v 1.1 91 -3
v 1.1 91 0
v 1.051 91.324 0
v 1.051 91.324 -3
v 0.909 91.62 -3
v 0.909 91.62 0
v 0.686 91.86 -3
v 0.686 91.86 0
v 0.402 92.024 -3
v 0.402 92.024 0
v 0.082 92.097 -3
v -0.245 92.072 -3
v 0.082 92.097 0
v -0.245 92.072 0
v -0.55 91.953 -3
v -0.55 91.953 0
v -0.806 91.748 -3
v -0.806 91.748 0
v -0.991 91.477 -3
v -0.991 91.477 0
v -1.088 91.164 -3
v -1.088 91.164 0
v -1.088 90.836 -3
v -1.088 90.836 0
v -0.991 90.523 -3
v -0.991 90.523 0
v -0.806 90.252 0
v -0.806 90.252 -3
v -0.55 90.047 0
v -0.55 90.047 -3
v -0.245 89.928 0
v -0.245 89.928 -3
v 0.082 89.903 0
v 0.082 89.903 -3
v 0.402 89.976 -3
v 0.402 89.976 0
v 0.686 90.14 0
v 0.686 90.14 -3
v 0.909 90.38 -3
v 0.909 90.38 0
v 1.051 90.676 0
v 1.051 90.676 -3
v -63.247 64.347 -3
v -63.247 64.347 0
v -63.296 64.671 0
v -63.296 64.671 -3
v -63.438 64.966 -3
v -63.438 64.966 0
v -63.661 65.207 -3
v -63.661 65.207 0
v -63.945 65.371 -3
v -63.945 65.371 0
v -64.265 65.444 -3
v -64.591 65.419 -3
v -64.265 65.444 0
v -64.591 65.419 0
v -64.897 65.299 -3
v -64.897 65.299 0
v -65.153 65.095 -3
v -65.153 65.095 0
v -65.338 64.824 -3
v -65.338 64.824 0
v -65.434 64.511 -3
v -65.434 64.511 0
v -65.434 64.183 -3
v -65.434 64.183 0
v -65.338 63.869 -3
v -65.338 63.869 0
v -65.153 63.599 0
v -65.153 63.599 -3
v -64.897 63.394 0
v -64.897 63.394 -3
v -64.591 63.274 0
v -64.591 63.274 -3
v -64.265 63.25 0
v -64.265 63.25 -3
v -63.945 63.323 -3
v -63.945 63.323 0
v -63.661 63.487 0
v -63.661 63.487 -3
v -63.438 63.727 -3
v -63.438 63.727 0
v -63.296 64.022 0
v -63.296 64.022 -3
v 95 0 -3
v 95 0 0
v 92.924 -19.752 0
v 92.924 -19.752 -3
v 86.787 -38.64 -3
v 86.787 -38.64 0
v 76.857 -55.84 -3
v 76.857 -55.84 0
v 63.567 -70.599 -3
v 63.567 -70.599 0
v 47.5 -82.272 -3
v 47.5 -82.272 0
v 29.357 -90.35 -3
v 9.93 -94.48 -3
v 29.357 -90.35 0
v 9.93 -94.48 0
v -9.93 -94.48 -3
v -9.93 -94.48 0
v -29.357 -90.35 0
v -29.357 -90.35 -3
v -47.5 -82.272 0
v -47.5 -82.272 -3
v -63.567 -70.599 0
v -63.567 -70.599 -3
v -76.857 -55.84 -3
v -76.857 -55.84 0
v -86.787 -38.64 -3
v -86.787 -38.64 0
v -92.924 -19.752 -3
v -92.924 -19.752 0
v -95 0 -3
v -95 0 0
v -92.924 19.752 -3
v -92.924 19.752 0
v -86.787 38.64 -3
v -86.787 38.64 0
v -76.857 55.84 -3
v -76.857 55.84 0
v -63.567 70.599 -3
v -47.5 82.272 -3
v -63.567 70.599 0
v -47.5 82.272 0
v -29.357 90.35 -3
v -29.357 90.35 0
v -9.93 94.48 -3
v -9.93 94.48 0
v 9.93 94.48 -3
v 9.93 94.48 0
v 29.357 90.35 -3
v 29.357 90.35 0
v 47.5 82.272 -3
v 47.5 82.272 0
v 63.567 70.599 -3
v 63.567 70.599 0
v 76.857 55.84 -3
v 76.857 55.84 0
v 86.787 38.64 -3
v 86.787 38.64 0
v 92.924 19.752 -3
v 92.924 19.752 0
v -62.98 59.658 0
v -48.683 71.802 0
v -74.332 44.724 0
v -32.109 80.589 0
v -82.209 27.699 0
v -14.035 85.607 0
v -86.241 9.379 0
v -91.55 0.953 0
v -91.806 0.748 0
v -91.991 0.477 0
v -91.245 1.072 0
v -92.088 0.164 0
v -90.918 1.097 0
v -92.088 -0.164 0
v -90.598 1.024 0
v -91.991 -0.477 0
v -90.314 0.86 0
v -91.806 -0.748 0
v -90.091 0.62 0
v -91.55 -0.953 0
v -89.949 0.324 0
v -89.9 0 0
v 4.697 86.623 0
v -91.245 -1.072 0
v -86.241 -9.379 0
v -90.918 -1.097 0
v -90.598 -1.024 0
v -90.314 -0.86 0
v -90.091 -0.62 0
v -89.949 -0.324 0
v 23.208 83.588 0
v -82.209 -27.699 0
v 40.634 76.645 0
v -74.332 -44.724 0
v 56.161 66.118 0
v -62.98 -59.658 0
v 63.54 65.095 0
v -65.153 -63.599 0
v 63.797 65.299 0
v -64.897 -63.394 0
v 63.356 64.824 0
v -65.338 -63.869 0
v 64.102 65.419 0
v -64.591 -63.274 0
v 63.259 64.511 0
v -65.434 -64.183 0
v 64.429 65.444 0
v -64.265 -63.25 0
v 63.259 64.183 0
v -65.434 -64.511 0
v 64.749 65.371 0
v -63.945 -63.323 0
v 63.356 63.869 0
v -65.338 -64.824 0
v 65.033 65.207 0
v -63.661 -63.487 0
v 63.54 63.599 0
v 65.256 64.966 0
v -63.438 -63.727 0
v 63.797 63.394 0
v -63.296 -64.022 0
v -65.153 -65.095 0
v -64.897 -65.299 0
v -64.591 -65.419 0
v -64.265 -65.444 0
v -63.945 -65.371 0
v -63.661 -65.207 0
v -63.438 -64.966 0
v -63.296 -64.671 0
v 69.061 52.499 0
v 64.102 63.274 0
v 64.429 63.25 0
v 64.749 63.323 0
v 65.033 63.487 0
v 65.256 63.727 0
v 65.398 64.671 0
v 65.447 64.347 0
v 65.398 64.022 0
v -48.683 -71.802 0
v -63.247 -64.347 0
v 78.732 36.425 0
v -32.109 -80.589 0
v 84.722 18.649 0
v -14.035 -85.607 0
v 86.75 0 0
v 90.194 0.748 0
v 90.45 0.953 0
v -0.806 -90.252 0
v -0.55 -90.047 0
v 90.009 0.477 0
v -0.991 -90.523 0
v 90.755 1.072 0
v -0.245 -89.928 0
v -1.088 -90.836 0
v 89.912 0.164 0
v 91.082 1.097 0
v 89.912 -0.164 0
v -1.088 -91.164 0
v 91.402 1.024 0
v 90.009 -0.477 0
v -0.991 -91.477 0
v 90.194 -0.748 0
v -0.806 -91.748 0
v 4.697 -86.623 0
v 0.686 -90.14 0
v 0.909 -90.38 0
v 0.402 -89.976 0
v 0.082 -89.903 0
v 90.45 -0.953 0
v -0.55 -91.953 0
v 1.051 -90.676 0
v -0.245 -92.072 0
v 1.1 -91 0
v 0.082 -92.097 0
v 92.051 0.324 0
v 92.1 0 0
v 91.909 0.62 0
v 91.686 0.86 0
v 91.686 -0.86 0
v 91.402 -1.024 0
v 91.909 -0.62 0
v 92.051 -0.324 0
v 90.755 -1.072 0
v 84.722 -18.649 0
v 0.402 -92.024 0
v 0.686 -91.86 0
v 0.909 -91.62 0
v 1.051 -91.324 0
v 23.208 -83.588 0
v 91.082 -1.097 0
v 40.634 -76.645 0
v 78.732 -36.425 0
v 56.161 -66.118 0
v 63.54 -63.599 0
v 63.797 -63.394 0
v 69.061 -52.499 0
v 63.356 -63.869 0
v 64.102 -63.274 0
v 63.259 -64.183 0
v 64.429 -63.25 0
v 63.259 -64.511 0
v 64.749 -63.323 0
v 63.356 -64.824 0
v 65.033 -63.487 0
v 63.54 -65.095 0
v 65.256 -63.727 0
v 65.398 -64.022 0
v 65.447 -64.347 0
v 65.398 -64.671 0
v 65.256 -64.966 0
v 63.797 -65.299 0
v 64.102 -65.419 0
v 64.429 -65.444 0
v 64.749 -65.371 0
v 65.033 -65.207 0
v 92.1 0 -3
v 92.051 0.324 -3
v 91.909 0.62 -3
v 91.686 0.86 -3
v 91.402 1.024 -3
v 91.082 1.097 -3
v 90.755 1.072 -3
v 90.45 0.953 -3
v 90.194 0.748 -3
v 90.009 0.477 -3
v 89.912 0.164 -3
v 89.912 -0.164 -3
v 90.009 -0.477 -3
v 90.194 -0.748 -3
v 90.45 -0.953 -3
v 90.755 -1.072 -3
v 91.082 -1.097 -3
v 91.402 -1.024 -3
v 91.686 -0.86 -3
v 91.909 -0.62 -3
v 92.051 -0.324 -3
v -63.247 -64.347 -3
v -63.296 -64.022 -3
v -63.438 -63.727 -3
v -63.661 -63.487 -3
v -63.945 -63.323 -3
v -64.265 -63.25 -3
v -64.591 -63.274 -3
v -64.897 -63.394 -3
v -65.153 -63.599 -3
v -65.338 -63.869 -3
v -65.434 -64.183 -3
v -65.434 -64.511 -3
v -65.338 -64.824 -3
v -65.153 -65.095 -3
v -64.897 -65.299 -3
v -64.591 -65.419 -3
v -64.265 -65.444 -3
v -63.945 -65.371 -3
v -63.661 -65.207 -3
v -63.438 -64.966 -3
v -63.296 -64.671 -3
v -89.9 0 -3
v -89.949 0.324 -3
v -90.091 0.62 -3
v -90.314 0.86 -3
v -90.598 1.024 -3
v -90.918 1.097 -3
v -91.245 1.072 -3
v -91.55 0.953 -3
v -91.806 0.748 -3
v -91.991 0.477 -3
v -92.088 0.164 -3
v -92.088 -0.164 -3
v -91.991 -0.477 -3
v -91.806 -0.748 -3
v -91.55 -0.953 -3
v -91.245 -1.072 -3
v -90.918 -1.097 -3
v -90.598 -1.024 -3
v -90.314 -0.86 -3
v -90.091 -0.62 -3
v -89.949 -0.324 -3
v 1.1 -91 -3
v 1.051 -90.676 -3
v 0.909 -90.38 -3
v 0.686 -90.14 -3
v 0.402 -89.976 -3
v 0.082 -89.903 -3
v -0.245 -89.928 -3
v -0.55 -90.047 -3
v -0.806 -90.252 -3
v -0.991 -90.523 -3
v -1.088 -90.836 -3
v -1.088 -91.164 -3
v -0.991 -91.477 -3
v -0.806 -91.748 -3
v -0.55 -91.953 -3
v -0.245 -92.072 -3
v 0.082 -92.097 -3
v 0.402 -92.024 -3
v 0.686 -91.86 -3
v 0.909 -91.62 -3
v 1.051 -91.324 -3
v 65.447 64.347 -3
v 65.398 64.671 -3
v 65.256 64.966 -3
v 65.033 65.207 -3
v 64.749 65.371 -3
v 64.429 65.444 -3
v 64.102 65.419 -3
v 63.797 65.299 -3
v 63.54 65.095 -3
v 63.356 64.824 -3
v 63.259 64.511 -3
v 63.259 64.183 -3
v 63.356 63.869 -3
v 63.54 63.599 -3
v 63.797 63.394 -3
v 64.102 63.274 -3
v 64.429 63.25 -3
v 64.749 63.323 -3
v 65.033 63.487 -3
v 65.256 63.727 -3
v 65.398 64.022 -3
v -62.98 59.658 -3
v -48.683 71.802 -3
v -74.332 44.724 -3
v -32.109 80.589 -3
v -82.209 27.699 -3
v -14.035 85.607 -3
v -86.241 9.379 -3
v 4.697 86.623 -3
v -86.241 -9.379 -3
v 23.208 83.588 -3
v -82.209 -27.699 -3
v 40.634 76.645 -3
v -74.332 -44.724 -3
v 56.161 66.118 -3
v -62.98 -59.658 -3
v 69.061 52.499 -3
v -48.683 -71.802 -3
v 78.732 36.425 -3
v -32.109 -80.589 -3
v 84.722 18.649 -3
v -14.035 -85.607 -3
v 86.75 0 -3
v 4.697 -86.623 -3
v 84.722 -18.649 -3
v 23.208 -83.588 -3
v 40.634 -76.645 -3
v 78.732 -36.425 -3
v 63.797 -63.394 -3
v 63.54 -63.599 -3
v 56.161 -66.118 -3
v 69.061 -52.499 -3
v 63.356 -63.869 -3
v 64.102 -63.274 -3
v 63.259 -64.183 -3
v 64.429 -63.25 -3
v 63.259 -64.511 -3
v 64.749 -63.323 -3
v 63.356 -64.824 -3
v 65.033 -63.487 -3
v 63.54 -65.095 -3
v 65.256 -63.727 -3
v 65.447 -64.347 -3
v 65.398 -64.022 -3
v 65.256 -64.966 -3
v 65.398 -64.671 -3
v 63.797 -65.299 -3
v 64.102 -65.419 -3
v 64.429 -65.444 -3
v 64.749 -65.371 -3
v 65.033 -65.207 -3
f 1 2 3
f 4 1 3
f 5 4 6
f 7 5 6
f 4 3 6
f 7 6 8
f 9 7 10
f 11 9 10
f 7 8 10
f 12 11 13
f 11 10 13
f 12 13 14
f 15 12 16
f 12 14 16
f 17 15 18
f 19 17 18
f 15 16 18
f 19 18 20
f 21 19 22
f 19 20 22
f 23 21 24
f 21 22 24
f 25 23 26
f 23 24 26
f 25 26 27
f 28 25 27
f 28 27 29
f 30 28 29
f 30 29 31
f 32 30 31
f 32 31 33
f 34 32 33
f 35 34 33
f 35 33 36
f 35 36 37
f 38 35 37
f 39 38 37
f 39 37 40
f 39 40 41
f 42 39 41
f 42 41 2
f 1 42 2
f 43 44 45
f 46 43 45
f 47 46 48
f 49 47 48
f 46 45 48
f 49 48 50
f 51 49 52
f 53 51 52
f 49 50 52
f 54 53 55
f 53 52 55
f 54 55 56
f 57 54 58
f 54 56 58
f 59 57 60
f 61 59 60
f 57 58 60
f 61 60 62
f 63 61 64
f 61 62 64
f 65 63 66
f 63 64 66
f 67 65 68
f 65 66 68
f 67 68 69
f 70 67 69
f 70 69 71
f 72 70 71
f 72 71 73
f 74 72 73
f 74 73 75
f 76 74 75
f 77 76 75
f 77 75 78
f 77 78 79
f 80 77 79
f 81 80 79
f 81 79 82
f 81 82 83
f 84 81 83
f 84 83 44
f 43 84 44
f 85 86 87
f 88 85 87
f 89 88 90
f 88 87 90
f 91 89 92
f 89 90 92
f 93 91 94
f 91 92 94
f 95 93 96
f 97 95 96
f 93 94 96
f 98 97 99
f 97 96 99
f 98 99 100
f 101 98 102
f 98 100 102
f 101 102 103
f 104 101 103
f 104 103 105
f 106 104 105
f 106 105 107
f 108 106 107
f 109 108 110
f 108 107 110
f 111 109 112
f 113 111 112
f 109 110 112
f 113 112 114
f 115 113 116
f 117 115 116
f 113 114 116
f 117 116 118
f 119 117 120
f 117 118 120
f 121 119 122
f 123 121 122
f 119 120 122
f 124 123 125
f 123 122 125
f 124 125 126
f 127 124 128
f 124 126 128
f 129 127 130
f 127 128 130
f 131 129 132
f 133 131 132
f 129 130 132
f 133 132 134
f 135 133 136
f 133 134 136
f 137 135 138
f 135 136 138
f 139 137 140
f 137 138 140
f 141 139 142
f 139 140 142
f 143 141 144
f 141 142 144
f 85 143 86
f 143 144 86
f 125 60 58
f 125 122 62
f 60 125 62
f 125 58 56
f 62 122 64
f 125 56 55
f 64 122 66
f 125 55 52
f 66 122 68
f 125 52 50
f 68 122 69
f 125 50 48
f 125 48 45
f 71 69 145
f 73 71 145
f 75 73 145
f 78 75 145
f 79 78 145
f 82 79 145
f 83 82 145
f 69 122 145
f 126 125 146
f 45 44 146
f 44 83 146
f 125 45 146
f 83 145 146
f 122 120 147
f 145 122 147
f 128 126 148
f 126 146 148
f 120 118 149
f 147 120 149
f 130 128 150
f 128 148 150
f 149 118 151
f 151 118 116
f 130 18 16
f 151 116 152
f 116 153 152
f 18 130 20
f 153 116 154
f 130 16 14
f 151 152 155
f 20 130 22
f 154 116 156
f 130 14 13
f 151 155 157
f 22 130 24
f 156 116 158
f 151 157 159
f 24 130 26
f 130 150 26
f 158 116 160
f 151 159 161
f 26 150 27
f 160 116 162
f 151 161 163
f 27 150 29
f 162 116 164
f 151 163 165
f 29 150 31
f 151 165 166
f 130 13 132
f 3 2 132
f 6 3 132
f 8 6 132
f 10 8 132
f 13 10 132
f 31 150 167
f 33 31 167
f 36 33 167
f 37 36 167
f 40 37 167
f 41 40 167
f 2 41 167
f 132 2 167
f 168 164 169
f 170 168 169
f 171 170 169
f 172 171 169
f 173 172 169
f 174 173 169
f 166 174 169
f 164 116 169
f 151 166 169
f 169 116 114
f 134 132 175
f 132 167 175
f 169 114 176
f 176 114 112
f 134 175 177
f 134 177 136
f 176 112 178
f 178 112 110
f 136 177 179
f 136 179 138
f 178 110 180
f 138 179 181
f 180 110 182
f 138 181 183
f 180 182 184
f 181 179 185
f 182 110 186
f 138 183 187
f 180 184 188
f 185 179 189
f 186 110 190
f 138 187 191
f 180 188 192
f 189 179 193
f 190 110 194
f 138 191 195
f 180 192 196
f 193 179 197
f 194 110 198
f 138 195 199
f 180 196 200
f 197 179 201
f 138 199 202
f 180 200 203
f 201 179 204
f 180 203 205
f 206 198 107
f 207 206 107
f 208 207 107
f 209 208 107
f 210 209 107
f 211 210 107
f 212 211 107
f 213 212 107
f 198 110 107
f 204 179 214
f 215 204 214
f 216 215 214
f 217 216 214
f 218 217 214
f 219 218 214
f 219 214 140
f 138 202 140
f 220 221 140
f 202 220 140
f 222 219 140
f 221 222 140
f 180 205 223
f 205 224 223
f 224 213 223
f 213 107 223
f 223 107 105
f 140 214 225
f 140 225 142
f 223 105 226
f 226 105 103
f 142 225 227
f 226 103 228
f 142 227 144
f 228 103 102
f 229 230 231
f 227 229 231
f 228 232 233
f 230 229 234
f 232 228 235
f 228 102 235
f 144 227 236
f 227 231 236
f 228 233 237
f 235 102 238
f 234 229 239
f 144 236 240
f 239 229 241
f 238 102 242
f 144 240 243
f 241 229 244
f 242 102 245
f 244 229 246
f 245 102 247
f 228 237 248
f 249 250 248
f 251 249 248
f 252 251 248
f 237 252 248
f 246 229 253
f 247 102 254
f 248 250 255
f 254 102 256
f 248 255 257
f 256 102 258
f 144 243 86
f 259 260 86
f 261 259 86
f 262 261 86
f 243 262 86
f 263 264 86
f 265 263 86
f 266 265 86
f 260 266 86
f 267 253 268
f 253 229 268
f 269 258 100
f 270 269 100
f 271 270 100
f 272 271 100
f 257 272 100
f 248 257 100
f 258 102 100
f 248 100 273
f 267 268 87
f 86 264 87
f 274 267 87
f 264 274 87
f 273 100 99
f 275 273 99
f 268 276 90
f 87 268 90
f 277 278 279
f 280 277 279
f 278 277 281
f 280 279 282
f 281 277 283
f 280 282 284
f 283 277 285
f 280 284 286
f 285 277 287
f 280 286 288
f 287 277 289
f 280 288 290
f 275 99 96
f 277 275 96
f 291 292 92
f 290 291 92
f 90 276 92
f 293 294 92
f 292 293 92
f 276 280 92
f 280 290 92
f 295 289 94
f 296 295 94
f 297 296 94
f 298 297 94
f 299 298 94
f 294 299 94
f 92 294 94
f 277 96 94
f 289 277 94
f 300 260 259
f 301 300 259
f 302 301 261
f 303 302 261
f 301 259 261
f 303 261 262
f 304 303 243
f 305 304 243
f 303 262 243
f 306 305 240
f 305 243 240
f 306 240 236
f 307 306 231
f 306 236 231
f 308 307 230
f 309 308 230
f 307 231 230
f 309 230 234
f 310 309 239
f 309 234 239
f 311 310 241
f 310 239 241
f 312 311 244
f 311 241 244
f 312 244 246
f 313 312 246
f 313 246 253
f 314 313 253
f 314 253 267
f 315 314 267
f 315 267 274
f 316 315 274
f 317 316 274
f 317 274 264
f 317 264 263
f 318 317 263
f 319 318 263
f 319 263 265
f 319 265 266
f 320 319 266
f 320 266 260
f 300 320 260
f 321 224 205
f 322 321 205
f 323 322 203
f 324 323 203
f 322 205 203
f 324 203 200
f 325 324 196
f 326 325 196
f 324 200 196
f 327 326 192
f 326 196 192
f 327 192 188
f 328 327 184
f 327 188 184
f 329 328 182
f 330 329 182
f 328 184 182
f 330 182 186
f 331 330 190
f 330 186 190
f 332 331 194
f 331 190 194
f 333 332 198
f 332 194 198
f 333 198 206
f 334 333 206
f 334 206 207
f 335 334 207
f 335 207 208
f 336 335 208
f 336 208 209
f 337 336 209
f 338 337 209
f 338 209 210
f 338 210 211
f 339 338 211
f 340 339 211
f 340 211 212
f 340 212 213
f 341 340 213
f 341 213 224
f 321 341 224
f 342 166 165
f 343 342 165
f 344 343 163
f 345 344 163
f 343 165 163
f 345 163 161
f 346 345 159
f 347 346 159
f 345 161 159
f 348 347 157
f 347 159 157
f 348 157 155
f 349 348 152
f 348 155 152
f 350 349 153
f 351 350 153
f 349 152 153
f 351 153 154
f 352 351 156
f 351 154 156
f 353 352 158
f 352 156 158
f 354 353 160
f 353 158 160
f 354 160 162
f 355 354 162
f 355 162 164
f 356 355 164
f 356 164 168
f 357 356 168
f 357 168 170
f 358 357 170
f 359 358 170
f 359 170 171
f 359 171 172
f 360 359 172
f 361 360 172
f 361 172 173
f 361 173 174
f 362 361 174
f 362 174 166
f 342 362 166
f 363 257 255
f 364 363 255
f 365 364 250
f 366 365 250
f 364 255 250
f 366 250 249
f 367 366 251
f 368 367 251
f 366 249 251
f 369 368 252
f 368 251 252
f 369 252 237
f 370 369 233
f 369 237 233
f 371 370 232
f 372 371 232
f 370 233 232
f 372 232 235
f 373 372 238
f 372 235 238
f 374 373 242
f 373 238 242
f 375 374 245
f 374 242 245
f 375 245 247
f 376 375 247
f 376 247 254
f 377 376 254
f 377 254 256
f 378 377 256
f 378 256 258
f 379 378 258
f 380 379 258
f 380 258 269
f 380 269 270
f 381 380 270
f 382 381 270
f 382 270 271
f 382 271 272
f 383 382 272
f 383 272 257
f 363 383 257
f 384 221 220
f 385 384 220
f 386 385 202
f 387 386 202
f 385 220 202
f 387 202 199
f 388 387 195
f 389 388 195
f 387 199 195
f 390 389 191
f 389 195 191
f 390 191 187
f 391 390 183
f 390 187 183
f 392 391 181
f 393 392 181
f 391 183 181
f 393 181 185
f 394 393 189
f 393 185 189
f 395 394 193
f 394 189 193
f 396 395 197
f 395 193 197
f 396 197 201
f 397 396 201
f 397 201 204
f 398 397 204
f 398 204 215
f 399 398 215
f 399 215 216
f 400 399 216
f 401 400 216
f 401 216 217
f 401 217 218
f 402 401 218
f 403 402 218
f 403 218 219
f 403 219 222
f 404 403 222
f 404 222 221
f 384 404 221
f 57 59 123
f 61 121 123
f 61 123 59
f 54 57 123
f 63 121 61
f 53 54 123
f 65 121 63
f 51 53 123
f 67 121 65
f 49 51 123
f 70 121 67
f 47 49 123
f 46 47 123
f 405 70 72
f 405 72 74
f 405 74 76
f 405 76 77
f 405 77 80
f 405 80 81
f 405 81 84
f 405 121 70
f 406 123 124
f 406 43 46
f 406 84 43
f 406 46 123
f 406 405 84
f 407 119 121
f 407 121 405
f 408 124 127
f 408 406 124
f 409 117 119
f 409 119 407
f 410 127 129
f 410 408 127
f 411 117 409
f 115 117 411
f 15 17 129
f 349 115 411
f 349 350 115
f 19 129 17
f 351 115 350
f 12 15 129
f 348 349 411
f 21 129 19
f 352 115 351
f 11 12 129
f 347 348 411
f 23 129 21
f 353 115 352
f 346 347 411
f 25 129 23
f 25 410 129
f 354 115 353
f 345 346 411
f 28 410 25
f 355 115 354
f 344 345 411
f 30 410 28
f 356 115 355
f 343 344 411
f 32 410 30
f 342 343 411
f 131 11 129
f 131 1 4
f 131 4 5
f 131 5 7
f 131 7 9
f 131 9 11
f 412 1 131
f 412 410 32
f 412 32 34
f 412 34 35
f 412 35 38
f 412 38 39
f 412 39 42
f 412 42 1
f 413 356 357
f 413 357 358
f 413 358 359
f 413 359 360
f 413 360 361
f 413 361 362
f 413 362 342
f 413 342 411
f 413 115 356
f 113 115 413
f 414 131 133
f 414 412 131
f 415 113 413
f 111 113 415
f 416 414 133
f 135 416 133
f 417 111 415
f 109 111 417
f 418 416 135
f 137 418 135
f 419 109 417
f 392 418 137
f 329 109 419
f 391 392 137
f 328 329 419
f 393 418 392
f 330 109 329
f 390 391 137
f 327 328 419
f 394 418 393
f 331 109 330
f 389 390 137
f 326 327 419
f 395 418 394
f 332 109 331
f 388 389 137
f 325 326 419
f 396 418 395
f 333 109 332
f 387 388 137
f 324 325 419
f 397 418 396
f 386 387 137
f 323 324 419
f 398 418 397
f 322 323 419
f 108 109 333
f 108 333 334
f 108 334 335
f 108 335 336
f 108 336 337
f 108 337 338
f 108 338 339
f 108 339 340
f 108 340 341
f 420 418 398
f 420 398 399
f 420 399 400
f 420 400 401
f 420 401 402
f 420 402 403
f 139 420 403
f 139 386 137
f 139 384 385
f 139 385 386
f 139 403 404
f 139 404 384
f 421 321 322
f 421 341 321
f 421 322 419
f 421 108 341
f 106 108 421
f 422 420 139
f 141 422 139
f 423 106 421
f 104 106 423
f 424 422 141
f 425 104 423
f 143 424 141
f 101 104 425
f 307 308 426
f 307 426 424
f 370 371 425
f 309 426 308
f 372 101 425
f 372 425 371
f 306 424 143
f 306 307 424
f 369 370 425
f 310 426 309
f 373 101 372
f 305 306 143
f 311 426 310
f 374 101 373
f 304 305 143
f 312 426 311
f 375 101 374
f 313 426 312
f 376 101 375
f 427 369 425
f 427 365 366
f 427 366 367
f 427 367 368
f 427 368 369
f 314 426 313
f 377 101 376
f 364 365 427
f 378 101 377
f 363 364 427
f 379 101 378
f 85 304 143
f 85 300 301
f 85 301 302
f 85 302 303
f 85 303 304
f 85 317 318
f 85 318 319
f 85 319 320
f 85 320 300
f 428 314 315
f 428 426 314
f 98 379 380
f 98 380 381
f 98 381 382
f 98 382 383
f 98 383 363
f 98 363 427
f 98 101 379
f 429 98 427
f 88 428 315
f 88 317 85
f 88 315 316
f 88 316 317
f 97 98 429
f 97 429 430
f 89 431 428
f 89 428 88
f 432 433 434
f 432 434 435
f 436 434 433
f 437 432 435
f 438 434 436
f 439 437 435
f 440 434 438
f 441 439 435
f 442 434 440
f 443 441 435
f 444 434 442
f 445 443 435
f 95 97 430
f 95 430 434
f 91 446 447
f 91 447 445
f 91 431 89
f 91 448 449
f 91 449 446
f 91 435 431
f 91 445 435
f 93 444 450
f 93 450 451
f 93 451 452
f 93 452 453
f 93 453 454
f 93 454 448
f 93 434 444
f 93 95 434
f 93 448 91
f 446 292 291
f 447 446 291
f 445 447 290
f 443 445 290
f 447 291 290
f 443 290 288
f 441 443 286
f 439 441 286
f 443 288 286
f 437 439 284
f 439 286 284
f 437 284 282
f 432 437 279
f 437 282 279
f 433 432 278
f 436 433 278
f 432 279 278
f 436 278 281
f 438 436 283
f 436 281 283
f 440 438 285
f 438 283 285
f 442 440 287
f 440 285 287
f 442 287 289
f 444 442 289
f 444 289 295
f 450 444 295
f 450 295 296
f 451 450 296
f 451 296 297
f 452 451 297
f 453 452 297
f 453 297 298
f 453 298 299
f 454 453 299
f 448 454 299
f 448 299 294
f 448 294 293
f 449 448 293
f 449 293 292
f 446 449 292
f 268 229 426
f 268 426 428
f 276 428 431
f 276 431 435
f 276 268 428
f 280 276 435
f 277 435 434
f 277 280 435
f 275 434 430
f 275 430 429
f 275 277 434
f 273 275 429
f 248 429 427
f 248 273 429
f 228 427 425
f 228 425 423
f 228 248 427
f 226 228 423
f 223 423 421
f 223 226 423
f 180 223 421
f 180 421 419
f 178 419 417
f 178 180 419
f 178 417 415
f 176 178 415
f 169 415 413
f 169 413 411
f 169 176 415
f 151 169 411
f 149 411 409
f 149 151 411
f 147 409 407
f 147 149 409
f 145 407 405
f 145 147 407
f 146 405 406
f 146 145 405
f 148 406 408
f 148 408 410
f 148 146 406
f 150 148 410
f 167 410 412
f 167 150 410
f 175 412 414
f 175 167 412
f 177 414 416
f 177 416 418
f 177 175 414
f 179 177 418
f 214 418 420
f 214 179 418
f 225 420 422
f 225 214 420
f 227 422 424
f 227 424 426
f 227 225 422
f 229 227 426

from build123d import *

# Parameters (mm, degrees)
SKETCH001_R       = 95
SKETCH001_R_2     = 86.75
PAD_DEPTH         = 3
SKETCH_R          = 1.1
POCKET_DEPTH      = 3.001
POCKET_DEPTH_BACK = 0.001


with BuildPart() as part:
    # Sketch001 → Pad (new body)
    with BuildSketch(Plane(origin=(0, 0, 0), x_dir=(1, 0, 0), z_dir=(0, 0, -1))):
        Circle(SKETCH001_R)
        Circle(SKETCH001_R_2, mode=Mode.SUBTRACT)
    extrude(amount=PAD_DEPTH)

    # Sketch → Pocket (cut, two sides)
    with BuildSketch(Plane.XY) as pocket_sk:
        with Locations((64.346717, 64.346717)):
            Circle(SKETCH_R)
        with Locations((0, 91)):
            Circle(SKETCH_R)
        with Locations((91, 0)):
            Circle(SKETCH_R)
        with Locations((64.346717, -64.346717)):
            Circle(SKETCH_R)
        with Locations((0, -91)):
            Circle(SKETCH_R)
        with Locations((-91, 0)):
            Circle(SKETCH_R)
        with Locations((-64.346717, -64.346717)):
            Circle(SKETCH_R)
        with Locations((-64.346717, 64.346717)):
            Circle(SKETCH_R)
    extrude(amount=-POCKET_DEPTH, mode=Mode.SUBTRACT)
    extrude(pocket_sk.sketch, amount=POCKET_DEPTH_BACK, mode=Mode.SUBTRACT)


solid = part.part
